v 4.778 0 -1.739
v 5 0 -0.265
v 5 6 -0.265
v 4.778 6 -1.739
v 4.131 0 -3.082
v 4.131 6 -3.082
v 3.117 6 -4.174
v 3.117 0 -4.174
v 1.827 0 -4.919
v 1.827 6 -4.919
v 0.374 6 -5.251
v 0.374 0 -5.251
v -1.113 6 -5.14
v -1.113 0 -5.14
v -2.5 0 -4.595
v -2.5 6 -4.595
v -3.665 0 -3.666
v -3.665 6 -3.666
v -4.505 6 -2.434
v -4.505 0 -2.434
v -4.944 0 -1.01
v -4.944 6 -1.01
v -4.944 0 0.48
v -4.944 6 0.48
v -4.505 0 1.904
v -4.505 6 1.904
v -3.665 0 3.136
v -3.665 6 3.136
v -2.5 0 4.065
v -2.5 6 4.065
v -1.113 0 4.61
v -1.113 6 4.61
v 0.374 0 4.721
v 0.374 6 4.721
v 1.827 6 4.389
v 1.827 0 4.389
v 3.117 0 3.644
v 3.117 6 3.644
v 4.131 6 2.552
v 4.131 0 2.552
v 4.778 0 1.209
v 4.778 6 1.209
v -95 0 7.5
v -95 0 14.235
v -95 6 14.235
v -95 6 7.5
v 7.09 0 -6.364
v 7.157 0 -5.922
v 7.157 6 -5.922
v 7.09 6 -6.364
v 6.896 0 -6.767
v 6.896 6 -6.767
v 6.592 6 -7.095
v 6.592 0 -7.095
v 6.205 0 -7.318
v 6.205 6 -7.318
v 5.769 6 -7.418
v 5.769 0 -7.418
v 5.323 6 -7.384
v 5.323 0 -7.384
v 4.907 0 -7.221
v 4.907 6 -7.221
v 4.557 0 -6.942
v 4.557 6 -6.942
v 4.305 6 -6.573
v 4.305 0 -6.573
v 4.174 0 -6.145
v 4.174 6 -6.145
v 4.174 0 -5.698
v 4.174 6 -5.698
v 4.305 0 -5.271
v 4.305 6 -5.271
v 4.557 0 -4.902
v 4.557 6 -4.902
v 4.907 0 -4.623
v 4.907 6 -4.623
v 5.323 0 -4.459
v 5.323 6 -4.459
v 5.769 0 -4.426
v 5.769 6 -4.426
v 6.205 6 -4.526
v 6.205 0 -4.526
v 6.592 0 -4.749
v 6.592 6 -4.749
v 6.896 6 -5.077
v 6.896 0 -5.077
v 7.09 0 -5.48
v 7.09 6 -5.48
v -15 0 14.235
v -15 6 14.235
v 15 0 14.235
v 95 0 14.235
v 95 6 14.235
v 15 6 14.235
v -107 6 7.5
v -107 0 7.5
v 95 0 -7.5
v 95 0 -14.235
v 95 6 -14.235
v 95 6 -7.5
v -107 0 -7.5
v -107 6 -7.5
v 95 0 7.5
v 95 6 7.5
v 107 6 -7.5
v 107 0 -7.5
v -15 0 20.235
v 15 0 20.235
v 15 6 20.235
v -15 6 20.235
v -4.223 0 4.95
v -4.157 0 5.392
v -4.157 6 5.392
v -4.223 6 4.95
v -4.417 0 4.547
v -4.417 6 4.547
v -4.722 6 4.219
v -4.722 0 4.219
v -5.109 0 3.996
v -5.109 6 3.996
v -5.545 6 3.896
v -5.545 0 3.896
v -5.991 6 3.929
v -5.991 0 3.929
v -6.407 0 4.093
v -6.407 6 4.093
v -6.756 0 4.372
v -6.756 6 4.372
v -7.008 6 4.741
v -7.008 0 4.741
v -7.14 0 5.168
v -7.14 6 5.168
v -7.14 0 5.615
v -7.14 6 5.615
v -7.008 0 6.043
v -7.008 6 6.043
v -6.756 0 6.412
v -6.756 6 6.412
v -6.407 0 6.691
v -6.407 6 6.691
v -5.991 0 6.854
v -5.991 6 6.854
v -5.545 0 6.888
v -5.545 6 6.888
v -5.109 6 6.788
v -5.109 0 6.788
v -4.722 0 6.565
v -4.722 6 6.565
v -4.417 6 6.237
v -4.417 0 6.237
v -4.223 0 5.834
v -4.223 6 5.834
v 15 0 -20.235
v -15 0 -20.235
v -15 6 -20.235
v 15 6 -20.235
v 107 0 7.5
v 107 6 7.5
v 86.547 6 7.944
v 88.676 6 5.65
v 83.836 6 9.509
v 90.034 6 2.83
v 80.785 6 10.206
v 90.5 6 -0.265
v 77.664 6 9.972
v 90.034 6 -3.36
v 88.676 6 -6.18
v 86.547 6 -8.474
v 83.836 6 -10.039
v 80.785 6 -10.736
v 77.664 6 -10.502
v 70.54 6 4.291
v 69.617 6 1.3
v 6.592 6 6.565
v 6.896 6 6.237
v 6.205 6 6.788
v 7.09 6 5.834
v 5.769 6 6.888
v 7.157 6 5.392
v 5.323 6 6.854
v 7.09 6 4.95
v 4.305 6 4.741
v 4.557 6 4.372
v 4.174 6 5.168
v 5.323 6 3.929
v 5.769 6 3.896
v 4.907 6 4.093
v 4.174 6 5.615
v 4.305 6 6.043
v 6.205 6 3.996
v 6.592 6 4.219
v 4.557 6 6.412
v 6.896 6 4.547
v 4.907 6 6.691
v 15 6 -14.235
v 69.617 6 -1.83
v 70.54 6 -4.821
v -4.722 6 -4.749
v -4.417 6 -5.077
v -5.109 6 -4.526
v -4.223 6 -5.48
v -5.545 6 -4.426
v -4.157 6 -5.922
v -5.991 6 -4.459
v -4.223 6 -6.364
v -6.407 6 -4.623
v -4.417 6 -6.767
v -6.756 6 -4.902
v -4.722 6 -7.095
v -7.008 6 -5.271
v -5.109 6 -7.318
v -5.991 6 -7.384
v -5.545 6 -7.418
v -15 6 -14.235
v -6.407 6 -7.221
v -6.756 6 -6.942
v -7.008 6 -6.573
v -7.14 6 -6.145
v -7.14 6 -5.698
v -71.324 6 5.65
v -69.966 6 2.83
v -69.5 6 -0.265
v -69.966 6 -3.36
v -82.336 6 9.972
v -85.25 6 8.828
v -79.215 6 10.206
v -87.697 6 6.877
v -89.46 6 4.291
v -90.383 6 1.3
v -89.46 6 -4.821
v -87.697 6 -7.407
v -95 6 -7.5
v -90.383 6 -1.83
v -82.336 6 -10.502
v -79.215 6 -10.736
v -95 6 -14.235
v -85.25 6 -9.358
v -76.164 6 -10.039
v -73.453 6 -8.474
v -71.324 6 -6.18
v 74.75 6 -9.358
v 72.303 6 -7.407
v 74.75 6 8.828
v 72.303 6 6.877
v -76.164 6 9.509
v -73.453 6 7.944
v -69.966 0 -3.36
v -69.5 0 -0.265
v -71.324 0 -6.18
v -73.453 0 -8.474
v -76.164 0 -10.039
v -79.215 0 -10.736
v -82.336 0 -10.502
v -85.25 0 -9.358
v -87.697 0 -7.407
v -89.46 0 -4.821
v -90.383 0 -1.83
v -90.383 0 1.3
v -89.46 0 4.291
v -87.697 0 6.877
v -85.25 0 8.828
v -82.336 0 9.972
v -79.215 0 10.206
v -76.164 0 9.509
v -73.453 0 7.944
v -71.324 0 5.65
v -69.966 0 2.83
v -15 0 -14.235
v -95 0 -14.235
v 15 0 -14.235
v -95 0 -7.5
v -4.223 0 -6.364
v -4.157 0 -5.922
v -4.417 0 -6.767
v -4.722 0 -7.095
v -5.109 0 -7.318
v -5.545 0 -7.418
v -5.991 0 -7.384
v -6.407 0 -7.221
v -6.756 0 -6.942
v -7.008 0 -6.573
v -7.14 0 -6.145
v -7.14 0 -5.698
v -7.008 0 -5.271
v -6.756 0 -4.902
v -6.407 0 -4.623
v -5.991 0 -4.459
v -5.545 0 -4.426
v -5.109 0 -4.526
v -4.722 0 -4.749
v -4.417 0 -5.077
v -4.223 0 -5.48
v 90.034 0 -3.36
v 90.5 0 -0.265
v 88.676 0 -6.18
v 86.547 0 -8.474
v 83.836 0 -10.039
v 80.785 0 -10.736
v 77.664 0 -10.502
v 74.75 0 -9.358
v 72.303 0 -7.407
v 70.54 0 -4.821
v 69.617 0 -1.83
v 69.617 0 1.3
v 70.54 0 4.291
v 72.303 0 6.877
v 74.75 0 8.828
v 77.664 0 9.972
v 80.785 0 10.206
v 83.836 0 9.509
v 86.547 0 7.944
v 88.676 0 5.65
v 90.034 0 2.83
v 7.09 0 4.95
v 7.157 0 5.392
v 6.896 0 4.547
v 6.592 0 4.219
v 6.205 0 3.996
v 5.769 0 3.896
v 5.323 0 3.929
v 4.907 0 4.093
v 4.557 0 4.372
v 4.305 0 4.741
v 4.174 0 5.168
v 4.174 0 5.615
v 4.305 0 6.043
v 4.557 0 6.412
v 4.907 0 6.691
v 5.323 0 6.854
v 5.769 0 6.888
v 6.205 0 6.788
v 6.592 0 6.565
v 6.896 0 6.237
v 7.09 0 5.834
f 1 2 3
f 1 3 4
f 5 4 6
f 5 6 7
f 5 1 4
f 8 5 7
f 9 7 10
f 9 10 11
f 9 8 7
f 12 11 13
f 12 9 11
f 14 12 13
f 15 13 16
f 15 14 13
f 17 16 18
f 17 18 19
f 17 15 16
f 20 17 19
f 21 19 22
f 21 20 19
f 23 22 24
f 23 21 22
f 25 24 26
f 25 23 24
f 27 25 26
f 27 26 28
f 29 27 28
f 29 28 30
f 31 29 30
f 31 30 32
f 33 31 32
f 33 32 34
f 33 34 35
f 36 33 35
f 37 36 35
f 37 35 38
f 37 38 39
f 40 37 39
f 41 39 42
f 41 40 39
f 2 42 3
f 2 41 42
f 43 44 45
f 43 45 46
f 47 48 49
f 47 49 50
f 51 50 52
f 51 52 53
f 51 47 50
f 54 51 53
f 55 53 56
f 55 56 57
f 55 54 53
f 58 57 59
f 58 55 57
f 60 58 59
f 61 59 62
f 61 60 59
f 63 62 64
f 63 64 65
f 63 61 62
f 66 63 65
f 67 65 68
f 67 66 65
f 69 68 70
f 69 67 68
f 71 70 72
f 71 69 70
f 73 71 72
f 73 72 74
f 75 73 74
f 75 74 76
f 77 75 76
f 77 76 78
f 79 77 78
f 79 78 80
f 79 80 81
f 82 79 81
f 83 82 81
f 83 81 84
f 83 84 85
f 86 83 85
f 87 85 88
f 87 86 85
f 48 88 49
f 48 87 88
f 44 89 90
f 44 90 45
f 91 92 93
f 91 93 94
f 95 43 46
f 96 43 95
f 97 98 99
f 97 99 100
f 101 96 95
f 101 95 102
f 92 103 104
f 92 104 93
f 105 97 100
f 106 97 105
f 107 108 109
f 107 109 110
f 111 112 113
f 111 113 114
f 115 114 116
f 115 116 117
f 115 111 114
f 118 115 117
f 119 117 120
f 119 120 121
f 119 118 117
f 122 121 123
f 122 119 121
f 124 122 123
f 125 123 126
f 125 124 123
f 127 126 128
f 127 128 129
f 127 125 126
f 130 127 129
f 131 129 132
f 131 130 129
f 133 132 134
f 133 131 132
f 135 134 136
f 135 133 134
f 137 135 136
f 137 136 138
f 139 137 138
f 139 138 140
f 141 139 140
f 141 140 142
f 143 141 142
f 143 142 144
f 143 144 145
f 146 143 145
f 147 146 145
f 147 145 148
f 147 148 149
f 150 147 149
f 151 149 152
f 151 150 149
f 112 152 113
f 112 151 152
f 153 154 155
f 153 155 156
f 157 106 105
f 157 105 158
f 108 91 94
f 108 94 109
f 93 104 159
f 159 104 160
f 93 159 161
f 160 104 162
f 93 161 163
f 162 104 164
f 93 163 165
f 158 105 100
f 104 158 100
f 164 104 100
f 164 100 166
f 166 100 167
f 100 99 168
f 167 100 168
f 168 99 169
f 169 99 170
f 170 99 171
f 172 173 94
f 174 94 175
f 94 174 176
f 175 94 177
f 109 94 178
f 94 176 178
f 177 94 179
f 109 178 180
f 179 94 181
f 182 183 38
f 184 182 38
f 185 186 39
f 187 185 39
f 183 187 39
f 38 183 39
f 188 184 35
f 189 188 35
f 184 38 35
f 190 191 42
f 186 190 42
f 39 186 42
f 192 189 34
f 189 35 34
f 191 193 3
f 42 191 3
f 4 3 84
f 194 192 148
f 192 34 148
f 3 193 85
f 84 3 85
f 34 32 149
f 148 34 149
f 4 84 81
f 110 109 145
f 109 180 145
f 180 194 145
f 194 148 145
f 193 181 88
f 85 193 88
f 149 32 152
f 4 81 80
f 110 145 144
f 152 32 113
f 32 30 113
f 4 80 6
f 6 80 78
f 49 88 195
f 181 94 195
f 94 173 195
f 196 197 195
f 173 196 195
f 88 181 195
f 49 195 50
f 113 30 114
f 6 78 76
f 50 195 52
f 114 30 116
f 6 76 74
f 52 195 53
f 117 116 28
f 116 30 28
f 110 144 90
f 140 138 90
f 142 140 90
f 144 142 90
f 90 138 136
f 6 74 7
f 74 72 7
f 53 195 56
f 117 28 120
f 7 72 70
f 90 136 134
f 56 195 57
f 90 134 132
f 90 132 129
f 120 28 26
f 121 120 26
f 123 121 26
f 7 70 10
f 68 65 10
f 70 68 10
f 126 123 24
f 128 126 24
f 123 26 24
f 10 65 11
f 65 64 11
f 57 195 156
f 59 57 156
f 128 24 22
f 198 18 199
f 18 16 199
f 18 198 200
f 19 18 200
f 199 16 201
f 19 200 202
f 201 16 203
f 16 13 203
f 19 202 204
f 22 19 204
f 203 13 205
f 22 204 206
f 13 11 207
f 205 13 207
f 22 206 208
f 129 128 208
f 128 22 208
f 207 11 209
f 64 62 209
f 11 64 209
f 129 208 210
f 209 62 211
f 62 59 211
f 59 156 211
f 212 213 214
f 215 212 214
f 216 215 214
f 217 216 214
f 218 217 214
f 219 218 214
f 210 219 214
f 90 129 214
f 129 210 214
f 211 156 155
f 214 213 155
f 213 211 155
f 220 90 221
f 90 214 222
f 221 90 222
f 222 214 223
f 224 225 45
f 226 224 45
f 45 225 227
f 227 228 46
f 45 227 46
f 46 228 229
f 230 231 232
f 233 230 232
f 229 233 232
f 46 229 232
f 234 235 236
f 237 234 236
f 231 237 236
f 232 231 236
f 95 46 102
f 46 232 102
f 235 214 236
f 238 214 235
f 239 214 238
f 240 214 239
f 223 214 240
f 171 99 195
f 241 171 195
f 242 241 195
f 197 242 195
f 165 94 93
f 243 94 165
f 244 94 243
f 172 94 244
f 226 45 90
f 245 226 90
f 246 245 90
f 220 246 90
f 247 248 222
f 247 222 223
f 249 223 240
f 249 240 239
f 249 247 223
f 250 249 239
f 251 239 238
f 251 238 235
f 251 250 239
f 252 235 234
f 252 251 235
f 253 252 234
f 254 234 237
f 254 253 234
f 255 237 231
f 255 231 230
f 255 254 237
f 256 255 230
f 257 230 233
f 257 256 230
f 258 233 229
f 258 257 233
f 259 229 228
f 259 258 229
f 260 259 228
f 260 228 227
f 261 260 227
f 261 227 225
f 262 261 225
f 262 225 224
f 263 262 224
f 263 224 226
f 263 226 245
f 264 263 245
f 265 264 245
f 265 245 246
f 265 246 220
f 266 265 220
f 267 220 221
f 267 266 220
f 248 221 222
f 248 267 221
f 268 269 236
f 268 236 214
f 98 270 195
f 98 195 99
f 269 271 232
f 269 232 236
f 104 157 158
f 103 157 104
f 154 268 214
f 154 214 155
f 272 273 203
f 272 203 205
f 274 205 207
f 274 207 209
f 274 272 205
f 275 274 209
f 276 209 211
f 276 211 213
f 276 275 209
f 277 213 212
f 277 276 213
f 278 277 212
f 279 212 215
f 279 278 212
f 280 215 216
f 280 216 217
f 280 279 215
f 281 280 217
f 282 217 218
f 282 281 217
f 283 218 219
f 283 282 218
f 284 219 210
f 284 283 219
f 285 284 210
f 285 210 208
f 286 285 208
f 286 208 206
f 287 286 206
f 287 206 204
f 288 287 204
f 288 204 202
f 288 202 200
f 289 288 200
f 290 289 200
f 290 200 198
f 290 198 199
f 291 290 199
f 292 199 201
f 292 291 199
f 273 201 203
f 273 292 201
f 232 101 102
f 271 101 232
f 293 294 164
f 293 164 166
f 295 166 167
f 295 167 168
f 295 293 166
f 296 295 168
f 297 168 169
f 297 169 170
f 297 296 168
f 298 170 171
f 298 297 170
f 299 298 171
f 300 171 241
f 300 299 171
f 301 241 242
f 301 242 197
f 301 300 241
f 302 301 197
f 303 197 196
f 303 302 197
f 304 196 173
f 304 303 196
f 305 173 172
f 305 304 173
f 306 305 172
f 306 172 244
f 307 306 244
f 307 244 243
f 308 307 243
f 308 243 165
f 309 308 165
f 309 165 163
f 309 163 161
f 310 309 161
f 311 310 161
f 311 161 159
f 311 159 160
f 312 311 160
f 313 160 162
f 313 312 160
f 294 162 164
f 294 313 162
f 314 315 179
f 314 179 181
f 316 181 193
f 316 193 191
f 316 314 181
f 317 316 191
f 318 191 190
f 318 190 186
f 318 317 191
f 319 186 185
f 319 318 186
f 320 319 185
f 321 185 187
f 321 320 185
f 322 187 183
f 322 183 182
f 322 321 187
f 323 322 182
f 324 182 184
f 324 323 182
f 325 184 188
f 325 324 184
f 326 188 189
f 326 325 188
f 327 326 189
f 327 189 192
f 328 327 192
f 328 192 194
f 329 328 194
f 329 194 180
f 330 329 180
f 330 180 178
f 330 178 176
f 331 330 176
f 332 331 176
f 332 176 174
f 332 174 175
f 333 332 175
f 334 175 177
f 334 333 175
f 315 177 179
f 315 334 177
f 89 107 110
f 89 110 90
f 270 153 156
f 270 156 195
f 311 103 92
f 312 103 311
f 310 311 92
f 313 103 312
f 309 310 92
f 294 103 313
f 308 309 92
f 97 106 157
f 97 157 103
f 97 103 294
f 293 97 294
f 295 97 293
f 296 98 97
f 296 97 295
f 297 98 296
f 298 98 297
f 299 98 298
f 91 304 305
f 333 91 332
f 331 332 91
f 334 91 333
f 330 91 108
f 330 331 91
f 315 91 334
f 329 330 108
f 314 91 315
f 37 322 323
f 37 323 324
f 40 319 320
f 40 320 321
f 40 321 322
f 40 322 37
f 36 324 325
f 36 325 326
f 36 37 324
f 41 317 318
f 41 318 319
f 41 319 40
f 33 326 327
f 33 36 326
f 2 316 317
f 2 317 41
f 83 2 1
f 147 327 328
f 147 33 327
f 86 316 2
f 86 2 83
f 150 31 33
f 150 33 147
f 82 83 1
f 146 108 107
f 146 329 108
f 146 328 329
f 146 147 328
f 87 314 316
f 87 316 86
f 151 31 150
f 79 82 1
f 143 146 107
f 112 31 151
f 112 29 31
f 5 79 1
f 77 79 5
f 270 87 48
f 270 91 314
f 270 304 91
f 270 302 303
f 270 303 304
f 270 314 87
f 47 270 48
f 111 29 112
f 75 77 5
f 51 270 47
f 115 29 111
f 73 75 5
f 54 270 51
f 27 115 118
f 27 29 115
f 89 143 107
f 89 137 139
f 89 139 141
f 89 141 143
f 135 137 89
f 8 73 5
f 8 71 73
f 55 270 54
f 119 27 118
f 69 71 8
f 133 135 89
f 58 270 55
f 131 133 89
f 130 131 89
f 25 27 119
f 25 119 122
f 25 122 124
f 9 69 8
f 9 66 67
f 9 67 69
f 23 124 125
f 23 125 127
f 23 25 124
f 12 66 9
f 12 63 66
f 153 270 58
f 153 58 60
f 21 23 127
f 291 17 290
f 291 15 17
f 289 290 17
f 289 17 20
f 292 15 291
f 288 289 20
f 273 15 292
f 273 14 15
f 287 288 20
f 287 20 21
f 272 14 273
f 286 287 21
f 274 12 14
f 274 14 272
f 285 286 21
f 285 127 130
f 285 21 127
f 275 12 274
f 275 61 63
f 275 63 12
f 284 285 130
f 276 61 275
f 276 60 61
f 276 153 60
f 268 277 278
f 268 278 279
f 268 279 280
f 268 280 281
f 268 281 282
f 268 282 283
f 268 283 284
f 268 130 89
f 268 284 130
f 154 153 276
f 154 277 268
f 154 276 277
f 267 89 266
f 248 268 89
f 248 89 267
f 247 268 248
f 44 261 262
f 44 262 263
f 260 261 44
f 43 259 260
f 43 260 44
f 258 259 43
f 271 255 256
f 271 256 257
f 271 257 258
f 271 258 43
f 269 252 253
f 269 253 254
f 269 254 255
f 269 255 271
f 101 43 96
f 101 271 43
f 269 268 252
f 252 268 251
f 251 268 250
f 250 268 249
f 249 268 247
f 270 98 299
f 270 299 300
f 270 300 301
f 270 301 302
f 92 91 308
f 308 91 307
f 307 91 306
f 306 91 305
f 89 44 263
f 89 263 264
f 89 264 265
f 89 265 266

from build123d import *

# Parameters (mm, degrees)
SKETCH_1_R      = 10.5
SKETCH_1_R_2    = 5
SKETCH_1_R_3    = 1.5
EXTRUDE_1_DEPTH = 6


with BuildPart() as part:
    # Эскиз1 → Бобышка-Вытянуть1 (new body)
    with BuildSketch(Plane(origin=(0, 0, 0), x_dir=(1, 0, 0), z_dir=(0, 1, 0))):
        Polygon((-95, 14.235), (-15, 14.235), (-15, 20.235), (15, 20.235), (15, 14.235), (95, 14.235), (95, 7.5), (107, 7.5), (107, -7.5), (95, -7.5), (95, -14.235), (15, -14.235), (15, -20.235), (-15, -20.235), (-15, -14.235), (-95, -14.235), (-95, -7.5), (-107, -7.5), (-107, 7.5), (-95, 7.5), align=None)
        with Locations((-80, 0.265)):
            Circle(SKETCH_1_R, mode=Mode.SUBTRACT)
        with Locations((80, 0.265)):
            Circle(SKETCH_1_R, mode=Mode.SUBTRACT)
        with Locations((0, 0.265)):
            Circle(SKETCH_1_R_2, mode=Mode.SUBTRACT)
        with Locations((-5.656854249, 5.921854249)):
            Circle(SKETCH_1_R_3, mode=Mode.SUBTRACT)
        with Locations((5.656854249, 5.921854249)):
            Circle(SKETCH_1_R_3, mode=Mode.SUBTRACT)
        with Locations((5.656854249, -5.391854249)):
            Circle(SKETCH_1_R_3, mode=Mode.SUBTRACT)
        with Locations((-5.656854249, -5.391854249)):
            Circle(SKETCH_1_R_3, mode=Mode.SUBTRACT)
    extrude(amount=EXTRUDE_1_DEPTH)


solid = part.part
